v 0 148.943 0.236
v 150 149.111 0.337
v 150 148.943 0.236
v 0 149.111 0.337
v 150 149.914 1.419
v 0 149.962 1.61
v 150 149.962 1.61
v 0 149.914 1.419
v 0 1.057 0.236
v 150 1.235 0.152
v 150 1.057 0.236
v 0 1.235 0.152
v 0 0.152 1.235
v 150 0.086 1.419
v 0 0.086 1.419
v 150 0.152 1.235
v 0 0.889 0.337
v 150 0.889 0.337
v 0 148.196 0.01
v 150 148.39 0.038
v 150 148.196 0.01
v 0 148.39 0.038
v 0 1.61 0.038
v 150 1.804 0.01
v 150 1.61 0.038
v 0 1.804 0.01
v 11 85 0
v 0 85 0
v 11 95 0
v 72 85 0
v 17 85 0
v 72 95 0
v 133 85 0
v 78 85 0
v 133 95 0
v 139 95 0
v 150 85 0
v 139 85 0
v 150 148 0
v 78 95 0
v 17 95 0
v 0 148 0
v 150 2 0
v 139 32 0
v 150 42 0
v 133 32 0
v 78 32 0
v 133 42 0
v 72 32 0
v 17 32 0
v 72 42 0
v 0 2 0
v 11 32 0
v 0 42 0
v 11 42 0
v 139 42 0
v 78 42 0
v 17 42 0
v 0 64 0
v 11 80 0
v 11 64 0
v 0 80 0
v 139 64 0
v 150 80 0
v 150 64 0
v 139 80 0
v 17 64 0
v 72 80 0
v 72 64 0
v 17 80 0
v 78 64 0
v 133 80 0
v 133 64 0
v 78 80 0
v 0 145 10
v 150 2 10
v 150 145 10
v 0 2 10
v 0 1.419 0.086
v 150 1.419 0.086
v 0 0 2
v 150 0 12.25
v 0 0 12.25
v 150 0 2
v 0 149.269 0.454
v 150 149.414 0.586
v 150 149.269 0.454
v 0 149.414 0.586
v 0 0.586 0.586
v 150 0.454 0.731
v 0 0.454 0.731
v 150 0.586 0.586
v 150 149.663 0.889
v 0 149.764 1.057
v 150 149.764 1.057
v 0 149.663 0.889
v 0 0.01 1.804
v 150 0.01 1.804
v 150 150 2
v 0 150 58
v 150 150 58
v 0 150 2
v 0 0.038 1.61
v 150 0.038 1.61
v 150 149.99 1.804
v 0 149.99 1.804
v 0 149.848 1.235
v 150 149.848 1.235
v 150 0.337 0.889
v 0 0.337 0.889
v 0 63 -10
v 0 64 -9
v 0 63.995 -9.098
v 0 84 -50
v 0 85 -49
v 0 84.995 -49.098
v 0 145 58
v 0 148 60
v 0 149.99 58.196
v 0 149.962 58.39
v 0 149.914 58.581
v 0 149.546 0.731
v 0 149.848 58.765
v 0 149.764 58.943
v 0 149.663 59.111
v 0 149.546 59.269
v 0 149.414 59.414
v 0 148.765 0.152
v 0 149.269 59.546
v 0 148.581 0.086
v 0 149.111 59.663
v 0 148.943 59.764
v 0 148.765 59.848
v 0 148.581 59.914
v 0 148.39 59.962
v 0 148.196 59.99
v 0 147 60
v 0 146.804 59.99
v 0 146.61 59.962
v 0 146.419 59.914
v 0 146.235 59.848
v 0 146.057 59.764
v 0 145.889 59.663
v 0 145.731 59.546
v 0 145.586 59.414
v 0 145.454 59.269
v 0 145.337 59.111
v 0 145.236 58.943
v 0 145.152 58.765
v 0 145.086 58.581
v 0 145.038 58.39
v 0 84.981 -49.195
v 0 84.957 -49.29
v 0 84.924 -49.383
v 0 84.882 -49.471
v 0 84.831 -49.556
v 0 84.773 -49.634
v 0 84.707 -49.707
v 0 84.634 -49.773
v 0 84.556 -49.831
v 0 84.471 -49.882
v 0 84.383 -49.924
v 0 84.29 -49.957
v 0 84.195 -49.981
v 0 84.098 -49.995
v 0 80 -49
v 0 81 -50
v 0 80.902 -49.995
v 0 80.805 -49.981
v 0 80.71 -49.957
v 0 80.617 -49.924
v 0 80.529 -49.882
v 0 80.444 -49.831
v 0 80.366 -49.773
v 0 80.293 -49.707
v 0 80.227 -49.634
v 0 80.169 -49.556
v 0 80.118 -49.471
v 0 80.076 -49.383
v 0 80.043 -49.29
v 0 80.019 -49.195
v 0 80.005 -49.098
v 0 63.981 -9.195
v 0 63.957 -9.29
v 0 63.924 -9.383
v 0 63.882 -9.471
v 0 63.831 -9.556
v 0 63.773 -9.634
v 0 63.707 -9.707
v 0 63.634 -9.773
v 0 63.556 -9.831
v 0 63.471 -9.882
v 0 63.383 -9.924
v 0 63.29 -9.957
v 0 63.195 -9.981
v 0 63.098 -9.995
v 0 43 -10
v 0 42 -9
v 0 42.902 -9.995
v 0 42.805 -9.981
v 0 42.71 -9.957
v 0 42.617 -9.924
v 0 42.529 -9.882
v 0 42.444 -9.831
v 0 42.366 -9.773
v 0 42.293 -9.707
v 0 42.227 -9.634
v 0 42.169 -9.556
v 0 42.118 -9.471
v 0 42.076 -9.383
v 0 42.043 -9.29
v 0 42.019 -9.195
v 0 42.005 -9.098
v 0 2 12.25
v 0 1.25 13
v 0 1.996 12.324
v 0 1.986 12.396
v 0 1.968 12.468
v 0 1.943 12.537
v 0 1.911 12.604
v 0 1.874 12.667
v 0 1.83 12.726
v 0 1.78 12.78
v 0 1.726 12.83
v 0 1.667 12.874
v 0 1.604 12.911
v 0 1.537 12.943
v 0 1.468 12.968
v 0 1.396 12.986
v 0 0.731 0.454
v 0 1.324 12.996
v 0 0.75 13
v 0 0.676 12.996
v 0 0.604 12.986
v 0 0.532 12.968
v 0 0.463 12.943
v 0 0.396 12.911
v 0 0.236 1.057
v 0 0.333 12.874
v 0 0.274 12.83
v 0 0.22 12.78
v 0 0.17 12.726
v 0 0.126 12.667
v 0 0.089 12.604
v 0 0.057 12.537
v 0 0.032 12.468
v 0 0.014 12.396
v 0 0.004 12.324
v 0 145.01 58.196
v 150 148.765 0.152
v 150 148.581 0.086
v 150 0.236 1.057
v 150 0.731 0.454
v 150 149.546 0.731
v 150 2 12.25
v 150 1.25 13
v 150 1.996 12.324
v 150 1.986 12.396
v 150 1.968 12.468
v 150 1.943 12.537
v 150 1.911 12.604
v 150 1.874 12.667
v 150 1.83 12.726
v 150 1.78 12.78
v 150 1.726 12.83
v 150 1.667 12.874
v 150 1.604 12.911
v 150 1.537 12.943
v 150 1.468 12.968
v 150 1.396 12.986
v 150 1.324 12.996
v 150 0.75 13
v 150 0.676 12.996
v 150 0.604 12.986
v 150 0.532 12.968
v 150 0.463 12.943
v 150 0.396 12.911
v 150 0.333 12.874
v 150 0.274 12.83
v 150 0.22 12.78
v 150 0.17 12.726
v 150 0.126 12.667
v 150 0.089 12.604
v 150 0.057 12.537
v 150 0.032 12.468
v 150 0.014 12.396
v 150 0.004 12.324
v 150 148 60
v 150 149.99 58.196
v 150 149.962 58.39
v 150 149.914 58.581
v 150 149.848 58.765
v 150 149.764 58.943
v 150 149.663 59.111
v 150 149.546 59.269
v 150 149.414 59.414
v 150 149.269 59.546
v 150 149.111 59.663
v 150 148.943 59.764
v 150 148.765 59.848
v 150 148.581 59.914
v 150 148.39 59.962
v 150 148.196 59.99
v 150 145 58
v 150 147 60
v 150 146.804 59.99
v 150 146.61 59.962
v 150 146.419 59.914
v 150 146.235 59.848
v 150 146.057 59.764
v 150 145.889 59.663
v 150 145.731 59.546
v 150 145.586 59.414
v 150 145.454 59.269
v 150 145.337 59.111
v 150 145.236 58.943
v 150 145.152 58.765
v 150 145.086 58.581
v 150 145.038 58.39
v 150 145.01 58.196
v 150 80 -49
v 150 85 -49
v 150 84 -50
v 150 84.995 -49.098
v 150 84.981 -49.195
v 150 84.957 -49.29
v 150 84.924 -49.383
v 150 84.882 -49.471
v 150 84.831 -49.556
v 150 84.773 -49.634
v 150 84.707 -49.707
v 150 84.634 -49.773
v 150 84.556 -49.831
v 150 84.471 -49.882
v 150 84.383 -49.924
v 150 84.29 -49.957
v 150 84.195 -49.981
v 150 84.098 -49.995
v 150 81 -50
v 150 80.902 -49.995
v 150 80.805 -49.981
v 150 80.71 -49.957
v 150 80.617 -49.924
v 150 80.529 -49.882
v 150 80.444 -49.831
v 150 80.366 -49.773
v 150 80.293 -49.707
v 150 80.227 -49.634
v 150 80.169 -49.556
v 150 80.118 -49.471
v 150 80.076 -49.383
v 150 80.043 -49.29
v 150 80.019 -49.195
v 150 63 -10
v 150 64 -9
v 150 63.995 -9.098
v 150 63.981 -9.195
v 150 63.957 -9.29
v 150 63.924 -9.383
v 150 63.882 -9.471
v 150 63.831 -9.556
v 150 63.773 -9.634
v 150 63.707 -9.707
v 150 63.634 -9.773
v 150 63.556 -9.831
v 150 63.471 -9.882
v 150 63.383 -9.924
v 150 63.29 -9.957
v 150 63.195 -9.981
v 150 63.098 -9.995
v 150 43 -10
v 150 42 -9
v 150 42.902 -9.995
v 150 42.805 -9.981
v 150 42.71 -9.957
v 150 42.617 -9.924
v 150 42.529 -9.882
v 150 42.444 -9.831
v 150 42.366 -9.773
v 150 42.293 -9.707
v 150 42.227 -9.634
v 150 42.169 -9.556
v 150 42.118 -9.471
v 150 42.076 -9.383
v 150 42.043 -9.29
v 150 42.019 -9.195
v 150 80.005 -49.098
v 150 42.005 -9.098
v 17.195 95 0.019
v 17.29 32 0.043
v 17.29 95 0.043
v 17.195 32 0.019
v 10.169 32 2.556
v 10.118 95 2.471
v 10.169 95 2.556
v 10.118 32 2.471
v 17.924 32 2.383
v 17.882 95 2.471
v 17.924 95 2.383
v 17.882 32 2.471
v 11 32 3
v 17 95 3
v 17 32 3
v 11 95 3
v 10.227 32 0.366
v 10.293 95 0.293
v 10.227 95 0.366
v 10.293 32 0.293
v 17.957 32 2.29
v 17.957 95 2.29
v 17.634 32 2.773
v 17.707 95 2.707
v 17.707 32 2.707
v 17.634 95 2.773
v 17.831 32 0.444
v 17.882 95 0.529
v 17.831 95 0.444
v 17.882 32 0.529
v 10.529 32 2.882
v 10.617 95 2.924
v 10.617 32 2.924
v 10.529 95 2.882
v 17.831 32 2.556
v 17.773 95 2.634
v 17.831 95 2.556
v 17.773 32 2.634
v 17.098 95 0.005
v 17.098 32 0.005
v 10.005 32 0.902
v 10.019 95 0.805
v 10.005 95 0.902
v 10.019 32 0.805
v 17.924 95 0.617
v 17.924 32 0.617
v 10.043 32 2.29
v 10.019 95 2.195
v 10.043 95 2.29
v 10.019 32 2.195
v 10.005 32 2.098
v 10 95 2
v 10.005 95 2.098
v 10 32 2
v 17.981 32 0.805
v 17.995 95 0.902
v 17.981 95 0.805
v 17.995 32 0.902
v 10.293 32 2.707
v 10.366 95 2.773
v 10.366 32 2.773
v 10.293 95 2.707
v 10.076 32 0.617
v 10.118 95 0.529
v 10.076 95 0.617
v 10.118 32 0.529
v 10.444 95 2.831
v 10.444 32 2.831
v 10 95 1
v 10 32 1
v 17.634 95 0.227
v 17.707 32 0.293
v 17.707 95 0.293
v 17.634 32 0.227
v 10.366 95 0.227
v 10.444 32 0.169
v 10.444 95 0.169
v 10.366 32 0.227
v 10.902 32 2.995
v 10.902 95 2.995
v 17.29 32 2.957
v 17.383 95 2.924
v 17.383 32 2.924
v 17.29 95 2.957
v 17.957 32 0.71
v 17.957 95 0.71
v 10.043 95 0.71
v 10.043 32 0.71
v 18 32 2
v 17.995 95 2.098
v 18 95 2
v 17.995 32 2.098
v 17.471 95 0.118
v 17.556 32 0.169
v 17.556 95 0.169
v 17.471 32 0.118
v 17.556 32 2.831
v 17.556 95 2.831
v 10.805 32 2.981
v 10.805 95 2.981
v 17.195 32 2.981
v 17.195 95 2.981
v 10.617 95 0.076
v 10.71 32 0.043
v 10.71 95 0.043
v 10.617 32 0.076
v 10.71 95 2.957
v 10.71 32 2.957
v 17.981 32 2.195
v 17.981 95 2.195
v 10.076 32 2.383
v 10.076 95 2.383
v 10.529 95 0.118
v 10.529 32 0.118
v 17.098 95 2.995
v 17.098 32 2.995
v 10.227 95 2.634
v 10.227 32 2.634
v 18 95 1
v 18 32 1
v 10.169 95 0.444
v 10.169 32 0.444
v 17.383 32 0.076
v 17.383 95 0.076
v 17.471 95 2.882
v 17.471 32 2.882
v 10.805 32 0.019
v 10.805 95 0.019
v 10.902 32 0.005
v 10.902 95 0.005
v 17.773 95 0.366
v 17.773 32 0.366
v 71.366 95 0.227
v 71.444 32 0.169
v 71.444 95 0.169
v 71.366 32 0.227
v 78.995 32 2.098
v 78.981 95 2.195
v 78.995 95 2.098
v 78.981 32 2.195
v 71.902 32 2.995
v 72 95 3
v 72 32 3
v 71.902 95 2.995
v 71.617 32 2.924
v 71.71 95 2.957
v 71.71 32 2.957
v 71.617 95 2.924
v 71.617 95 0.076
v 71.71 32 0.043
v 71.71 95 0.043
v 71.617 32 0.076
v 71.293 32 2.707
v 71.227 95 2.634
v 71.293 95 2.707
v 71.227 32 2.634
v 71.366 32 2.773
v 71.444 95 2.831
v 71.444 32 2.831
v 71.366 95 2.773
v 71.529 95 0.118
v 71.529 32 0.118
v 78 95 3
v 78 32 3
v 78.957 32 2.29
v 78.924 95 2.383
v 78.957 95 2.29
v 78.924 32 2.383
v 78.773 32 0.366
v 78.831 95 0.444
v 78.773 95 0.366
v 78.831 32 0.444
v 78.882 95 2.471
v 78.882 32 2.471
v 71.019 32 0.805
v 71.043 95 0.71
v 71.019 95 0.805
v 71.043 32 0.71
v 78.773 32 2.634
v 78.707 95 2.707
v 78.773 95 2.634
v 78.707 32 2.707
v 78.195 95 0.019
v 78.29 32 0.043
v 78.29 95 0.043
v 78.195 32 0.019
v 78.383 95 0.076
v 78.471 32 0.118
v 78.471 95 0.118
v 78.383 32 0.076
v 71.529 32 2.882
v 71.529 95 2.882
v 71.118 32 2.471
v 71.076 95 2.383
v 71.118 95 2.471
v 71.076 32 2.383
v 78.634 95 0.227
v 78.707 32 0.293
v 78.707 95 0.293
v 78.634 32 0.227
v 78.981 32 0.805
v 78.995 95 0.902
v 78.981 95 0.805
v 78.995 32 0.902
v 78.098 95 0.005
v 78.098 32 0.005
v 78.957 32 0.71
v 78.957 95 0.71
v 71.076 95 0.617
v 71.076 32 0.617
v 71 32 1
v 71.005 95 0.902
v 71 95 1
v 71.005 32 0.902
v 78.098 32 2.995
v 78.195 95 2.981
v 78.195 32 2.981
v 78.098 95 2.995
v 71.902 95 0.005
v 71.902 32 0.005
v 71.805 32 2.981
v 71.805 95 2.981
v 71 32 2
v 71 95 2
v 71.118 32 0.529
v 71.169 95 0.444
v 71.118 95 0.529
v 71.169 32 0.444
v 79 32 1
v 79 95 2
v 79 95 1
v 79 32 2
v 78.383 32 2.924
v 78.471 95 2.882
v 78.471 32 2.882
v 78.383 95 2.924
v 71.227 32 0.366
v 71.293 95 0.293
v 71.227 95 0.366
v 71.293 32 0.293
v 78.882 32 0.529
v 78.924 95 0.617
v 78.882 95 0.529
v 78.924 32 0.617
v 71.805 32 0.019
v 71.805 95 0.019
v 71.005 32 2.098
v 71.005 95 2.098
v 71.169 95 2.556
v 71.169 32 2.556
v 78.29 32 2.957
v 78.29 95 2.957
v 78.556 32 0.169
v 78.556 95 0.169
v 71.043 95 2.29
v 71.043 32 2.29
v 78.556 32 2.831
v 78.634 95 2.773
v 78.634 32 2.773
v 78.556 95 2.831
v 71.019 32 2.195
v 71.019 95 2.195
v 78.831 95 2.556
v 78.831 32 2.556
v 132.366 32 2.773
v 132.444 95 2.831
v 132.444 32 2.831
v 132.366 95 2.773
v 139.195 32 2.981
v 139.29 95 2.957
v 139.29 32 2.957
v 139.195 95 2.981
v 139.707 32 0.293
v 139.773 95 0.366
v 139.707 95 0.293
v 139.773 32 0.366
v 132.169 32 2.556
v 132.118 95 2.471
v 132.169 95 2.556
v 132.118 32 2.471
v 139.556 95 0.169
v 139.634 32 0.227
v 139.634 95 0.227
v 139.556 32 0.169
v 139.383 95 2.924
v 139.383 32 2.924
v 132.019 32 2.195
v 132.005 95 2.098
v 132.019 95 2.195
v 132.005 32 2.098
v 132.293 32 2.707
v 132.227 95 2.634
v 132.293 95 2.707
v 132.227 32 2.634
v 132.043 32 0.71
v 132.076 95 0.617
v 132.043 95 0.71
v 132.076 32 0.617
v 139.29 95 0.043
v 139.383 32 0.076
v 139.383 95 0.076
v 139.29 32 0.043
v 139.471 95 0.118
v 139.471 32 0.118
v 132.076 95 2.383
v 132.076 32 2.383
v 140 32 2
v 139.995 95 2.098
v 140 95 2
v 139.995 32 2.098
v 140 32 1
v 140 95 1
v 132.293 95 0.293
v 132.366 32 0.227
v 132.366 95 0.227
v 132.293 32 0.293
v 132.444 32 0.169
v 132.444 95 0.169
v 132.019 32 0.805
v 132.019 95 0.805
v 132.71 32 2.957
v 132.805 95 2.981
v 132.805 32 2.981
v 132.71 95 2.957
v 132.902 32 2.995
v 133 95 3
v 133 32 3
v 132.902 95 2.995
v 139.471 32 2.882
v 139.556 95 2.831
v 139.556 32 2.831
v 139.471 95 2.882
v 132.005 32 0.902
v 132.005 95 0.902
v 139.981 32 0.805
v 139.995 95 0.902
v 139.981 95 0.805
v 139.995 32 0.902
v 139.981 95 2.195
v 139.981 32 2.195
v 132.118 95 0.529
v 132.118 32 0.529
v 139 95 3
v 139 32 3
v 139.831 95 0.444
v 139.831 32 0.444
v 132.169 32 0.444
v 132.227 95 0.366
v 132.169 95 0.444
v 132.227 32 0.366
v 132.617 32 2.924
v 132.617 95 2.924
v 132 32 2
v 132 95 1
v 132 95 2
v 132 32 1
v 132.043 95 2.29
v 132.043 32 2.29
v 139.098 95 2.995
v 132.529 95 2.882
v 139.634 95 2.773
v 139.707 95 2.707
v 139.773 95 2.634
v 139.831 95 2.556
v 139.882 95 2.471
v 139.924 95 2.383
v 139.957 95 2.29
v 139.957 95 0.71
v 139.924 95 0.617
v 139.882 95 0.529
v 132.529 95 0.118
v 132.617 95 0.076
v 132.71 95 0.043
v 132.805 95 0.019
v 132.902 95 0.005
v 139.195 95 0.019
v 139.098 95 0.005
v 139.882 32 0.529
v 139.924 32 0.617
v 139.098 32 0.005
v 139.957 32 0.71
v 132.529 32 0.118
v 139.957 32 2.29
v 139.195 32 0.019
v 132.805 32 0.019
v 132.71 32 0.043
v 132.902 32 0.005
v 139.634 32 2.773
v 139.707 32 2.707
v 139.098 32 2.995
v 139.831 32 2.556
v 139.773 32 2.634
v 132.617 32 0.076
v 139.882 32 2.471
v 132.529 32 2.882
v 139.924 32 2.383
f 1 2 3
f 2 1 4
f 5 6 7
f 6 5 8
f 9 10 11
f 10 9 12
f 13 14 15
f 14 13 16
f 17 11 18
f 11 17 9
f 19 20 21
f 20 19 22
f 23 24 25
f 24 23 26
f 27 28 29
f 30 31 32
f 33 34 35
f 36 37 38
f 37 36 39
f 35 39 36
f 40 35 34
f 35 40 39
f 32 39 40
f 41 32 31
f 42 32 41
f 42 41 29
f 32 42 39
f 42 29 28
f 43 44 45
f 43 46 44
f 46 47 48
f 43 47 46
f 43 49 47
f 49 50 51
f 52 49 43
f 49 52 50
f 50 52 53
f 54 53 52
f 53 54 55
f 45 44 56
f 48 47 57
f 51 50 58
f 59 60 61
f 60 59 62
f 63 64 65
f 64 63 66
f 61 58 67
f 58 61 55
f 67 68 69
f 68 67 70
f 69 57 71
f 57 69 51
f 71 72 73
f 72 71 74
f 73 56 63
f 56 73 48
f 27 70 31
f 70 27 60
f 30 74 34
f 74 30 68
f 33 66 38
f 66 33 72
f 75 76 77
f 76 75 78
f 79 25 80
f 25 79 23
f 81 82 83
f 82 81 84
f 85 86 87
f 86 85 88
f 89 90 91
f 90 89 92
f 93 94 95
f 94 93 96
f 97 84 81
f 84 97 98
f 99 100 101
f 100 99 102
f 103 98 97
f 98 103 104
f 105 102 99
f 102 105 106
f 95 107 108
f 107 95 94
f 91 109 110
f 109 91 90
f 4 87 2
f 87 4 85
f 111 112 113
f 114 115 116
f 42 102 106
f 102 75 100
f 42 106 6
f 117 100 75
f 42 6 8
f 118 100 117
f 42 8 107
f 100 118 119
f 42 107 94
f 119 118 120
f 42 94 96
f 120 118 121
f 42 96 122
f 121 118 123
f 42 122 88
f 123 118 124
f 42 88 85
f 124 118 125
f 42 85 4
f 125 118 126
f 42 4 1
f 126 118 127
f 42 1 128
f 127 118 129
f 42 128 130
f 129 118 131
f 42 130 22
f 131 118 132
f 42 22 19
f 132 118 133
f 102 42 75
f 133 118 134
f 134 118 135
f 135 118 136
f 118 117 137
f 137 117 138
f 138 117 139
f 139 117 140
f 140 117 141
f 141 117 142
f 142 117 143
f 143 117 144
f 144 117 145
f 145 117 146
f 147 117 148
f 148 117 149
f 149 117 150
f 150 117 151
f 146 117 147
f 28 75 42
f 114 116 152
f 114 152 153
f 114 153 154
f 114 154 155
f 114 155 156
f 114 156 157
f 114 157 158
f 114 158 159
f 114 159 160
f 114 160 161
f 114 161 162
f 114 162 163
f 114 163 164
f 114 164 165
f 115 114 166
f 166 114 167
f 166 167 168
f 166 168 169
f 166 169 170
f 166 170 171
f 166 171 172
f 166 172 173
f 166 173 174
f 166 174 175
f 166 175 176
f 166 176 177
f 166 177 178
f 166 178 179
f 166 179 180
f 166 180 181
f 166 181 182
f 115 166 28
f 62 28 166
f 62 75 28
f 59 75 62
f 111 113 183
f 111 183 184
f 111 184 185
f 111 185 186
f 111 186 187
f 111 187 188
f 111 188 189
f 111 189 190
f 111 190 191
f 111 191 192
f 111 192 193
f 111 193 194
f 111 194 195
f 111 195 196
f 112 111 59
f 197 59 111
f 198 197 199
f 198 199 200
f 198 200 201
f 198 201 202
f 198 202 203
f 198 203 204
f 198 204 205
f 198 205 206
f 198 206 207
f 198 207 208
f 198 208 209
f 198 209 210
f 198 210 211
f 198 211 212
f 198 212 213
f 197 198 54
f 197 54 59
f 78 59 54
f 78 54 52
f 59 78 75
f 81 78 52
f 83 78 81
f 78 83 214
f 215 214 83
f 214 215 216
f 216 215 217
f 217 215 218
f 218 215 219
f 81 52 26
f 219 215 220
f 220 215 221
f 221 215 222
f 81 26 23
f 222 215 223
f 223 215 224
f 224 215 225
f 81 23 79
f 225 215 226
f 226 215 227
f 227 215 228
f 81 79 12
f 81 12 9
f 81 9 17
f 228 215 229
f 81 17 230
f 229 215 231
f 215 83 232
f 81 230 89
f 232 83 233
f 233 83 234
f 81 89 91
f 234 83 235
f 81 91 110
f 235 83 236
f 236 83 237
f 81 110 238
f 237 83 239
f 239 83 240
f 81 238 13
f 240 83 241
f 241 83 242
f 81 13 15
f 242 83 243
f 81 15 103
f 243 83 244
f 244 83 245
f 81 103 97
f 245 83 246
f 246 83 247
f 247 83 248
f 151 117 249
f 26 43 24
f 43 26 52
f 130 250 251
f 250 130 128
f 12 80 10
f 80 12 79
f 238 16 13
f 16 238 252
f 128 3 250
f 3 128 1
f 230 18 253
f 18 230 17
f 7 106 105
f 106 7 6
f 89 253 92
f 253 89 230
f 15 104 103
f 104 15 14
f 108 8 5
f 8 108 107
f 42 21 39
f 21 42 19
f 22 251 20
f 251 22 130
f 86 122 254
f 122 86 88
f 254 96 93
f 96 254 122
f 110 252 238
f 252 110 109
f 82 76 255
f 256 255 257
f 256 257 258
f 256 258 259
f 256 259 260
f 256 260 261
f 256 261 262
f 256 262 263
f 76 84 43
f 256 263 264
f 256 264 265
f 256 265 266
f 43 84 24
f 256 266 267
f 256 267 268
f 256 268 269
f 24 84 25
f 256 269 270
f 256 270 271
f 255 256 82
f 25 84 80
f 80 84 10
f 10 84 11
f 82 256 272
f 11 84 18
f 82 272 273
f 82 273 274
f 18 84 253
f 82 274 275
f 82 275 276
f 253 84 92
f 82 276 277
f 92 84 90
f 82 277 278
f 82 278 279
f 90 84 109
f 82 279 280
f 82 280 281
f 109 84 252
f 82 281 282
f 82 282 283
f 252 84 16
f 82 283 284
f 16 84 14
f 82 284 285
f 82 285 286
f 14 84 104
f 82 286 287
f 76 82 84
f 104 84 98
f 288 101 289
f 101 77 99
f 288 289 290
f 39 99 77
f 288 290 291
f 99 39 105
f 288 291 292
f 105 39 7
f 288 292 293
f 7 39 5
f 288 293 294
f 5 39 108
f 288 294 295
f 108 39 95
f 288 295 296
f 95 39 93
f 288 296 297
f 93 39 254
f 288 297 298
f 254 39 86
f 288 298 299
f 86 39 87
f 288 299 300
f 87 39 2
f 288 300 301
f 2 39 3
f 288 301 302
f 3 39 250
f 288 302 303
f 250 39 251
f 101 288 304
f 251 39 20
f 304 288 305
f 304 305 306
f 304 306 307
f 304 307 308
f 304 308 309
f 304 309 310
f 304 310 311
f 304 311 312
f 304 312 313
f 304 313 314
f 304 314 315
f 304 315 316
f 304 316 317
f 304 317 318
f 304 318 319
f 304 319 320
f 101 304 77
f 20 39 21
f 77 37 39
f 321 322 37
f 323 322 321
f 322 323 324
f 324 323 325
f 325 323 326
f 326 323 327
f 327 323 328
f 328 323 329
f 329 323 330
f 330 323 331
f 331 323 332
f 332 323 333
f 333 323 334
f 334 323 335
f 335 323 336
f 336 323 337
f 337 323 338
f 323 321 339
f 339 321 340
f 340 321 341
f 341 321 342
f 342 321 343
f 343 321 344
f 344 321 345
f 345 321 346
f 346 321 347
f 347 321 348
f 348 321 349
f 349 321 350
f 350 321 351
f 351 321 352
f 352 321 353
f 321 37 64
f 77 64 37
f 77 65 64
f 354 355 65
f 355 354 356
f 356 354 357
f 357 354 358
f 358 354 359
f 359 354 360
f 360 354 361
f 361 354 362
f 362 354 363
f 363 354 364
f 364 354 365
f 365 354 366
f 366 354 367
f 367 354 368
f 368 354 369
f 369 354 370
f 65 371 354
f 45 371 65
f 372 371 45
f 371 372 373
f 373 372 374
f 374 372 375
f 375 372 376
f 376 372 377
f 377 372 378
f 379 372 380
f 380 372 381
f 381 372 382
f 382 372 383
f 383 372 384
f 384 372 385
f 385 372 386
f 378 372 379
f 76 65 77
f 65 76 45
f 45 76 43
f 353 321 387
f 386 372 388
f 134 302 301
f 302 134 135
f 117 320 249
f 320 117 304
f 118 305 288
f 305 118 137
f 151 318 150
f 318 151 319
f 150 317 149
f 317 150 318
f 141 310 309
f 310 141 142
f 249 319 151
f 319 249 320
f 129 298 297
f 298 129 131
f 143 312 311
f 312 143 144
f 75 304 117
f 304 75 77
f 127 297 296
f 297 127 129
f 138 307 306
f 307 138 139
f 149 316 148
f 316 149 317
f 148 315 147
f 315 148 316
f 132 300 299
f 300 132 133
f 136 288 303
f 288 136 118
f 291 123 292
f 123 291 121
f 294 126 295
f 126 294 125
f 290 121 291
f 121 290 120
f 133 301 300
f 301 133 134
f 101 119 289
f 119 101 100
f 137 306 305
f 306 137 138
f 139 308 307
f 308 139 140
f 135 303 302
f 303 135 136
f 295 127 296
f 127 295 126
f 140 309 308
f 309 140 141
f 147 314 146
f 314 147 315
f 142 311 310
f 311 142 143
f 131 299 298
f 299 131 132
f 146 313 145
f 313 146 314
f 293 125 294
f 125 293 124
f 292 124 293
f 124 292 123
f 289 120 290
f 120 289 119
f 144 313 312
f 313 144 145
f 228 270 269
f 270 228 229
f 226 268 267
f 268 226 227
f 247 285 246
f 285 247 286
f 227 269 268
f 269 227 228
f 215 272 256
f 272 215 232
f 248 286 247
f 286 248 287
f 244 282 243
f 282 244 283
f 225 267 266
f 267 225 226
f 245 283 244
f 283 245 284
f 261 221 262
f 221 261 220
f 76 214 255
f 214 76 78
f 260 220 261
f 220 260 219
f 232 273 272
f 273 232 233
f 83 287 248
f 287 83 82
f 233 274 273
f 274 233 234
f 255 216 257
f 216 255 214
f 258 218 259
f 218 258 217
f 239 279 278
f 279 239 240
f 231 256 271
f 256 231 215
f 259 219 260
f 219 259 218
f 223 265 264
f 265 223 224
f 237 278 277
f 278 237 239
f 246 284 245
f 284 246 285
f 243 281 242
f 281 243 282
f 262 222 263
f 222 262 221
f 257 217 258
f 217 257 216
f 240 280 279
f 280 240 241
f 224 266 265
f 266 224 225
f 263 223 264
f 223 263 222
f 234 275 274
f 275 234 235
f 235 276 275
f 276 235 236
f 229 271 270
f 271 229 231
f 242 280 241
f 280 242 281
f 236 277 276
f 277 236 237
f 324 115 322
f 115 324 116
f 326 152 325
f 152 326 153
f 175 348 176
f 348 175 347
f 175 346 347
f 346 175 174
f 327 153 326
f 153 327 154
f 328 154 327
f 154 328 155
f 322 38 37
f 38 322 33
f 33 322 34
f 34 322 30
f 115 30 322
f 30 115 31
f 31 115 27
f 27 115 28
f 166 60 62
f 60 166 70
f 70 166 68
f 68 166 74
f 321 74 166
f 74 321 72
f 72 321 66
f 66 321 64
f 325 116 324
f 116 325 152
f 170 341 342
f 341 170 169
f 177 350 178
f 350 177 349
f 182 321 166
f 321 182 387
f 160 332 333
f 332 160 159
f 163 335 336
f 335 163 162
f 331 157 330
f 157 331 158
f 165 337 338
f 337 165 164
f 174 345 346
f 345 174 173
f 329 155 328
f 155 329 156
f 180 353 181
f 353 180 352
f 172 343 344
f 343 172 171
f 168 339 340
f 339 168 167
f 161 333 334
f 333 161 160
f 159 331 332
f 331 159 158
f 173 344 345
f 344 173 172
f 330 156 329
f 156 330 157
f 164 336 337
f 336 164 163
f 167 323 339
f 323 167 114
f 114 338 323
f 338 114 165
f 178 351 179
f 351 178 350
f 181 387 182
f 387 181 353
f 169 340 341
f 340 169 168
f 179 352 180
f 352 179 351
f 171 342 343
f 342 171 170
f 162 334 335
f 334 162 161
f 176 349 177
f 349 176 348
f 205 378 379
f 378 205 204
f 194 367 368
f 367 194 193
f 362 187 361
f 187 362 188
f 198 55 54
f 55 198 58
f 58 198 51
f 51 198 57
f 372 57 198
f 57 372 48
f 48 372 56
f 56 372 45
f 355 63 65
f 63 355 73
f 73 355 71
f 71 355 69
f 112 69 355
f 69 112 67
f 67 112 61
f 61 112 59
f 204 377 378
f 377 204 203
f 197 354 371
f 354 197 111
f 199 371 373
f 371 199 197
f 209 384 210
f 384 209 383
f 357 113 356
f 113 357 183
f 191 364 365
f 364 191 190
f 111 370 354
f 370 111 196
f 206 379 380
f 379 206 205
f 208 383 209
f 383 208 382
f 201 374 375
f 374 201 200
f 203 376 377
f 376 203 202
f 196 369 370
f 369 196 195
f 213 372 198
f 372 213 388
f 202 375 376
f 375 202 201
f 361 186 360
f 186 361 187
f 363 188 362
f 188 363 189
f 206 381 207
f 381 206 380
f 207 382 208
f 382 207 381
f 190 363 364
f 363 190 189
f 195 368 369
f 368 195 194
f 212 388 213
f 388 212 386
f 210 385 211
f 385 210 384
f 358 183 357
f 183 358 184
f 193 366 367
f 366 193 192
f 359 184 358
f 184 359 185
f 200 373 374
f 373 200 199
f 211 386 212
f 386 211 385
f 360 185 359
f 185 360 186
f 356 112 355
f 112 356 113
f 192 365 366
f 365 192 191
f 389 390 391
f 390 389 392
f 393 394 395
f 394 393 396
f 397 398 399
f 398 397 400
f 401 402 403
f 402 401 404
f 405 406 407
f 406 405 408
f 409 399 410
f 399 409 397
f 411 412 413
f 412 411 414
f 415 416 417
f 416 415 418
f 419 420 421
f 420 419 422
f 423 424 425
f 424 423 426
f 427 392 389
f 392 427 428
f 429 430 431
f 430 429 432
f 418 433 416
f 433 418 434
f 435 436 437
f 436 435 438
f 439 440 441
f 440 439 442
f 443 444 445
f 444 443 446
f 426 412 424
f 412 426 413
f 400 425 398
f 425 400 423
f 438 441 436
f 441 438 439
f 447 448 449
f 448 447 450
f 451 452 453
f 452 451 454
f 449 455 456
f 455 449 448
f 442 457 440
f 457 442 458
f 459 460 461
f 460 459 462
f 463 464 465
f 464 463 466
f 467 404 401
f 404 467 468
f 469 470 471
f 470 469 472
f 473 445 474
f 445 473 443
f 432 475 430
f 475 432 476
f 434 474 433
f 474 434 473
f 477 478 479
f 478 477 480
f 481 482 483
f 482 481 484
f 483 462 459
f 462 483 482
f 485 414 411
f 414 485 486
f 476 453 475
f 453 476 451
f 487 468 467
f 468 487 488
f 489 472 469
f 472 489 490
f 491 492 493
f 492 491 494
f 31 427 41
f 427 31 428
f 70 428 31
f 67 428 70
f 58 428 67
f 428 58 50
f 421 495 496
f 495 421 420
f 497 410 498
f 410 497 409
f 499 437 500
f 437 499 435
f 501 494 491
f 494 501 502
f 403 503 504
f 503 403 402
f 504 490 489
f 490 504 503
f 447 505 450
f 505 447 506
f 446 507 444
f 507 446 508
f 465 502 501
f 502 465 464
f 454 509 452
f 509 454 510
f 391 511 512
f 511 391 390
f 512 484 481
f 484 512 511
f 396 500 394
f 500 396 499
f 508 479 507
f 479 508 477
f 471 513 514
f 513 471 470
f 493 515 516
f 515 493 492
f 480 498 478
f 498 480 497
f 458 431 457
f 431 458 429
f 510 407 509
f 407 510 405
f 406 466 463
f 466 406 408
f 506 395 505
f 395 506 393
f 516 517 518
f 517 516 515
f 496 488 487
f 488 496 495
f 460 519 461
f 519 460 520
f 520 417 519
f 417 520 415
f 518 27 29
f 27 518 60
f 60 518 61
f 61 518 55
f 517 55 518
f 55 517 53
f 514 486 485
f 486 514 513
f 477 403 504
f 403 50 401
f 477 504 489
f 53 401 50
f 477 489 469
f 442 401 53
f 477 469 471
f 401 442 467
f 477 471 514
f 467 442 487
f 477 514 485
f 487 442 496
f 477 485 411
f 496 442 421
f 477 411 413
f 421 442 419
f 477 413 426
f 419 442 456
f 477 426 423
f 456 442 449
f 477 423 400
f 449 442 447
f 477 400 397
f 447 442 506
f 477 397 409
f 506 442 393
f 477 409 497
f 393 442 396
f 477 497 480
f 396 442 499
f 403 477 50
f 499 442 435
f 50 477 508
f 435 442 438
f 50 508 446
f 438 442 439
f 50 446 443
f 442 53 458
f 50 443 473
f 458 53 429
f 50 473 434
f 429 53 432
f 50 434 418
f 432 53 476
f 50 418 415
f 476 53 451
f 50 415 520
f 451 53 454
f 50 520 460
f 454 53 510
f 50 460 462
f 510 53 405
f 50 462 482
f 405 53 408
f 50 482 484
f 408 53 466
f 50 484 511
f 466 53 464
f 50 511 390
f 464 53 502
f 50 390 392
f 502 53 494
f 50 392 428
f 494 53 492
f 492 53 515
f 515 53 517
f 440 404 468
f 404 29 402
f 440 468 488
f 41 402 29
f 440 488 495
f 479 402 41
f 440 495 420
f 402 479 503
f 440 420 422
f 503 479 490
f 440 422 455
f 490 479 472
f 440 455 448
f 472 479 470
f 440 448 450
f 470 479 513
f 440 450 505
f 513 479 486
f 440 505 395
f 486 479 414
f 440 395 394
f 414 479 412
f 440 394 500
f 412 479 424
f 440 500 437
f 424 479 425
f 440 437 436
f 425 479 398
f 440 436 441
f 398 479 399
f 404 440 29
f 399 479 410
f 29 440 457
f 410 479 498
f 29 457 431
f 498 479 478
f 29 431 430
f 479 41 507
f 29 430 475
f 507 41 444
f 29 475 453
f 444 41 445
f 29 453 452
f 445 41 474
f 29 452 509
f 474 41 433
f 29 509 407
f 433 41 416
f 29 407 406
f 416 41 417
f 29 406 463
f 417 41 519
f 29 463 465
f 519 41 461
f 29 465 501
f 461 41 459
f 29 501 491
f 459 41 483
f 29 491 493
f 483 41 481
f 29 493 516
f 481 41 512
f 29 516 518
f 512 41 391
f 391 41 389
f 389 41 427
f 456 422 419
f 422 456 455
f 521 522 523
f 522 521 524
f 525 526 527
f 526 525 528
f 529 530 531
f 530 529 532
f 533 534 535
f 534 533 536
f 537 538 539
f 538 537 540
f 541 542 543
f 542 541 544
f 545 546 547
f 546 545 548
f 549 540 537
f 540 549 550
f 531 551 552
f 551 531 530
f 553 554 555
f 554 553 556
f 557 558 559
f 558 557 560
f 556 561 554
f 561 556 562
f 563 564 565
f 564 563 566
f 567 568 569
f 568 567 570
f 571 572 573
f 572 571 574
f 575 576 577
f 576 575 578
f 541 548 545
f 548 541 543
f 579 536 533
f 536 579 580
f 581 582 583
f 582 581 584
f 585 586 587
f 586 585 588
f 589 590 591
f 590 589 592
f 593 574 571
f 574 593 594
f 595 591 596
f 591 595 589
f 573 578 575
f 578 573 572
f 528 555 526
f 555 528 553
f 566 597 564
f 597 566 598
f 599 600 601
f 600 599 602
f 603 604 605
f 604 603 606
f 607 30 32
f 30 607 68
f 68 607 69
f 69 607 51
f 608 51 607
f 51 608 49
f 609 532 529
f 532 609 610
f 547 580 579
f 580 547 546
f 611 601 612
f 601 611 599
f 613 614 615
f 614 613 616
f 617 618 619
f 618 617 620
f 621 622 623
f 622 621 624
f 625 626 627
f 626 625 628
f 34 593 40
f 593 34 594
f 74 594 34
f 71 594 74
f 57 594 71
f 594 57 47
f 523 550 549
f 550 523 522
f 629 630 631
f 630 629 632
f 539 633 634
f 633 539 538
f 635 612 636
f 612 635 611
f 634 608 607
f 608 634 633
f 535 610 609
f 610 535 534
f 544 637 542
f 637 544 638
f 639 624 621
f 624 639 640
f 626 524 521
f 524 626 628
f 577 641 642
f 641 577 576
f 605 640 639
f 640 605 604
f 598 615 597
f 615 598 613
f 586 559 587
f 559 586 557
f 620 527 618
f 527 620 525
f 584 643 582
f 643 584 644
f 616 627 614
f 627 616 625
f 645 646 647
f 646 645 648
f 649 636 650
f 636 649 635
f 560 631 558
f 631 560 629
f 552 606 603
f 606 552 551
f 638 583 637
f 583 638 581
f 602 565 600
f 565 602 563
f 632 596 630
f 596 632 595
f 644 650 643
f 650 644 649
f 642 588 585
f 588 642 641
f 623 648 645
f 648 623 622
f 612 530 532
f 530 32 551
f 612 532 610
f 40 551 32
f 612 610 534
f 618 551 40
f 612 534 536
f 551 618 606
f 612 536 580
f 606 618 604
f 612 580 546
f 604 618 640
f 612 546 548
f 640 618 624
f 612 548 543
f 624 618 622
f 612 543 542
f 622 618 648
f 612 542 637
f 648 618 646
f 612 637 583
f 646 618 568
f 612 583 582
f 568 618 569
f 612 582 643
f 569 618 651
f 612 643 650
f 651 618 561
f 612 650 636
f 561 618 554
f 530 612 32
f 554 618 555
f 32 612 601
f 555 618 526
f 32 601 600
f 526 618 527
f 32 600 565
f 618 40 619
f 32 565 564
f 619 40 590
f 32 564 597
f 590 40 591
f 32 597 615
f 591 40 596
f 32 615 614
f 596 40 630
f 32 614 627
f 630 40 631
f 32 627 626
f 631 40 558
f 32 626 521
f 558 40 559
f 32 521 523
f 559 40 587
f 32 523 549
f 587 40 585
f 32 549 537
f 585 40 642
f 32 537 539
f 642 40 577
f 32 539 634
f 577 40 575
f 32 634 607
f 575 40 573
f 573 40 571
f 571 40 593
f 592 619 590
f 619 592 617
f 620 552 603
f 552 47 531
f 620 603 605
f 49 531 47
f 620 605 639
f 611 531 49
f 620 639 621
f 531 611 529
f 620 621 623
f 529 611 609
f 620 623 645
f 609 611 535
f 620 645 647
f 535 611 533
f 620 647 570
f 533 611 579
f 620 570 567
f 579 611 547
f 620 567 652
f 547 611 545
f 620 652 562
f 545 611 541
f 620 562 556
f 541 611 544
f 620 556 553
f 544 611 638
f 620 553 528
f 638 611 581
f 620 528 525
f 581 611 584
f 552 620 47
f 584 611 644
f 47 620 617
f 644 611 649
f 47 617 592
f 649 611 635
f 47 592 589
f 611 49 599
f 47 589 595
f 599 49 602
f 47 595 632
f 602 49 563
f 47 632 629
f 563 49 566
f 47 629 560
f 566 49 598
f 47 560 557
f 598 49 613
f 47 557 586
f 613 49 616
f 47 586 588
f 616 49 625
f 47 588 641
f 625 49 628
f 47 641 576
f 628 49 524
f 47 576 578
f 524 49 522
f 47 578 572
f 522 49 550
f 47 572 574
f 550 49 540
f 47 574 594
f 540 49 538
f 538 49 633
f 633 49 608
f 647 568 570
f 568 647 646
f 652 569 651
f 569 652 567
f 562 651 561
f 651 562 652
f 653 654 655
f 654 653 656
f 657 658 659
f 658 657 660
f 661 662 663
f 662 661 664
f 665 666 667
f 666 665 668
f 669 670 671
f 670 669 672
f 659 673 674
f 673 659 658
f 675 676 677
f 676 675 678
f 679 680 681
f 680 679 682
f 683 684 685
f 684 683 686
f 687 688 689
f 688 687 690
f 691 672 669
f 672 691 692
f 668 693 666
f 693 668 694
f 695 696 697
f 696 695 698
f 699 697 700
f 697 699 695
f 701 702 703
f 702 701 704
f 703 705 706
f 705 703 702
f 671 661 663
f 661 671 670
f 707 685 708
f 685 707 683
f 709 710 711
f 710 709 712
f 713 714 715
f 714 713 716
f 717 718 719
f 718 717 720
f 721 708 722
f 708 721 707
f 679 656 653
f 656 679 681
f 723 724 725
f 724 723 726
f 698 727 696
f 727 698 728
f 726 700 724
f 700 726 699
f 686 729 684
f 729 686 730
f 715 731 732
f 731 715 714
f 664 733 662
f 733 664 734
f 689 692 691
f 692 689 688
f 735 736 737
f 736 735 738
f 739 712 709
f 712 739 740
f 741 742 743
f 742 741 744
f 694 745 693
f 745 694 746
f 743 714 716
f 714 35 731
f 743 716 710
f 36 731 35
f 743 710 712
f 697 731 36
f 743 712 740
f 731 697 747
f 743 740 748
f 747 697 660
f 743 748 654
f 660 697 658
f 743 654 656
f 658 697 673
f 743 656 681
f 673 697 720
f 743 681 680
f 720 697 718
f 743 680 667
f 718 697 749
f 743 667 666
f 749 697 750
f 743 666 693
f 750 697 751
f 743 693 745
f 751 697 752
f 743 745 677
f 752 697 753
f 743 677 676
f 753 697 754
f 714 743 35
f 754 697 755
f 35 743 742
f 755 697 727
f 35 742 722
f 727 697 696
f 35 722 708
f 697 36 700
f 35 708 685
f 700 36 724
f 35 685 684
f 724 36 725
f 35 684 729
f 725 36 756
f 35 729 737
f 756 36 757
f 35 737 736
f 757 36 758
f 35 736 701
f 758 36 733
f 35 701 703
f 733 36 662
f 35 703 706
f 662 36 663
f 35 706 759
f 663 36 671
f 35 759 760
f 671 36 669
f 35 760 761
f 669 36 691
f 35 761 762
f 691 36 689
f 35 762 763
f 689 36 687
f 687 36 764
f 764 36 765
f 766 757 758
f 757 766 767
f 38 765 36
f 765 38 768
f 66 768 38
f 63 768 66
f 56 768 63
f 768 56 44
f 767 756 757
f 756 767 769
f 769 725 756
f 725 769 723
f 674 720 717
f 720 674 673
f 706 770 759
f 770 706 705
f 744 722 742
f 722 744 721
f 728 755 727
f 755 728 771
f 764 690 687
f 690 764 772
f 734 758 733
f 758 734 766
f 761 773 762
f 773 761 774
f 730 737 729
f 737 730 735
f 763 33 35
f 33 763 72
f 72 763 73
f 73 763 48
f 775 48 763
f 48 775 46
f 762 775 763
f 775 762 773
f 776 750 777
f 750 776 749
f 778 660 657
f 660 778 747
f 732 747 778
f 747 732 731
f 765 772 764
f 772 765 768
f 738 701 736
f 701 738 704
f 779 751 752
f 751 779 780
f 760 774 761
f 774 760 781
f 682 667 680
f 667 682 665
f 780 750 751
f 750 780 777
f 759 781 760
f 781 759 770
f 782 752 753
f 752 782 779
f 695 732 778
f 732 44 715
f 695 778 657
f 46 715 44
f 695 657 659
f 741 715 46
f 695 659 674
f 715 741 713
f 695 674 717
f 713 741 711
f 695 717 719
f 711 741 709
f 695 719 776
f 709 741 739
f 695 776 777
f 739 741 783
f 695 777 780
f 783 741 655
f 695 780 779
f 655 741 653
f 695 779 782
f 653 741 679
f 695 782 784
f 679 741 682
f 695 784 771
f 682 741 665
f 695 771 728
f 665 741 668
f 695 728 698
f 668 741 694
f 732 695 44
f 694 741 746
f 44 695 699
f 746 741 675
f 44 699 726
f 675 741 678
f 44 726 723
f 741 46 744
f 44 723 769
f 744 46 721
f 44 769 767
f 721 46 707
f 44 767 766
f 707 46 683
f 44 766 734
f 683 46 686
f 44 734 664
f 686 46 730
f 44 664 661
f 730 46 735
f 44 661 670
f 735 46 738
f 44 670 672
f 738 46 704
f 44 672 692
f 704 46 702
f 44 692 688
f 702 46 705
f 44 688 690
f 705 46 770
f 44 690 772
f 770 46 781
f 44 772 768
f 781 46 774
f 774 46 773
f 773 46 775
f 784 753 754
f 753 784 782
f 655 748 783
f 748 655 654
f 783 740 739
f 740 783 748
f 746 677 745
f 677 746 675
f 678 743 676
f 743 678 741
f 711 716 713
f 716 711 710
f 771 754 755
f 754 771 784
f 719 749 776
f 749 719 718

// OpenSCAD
// 150mm-wide bar shelf — see bar_shelf.scad for the design.
shelf_width_override = 150;
include <bar_shelf.scad>
